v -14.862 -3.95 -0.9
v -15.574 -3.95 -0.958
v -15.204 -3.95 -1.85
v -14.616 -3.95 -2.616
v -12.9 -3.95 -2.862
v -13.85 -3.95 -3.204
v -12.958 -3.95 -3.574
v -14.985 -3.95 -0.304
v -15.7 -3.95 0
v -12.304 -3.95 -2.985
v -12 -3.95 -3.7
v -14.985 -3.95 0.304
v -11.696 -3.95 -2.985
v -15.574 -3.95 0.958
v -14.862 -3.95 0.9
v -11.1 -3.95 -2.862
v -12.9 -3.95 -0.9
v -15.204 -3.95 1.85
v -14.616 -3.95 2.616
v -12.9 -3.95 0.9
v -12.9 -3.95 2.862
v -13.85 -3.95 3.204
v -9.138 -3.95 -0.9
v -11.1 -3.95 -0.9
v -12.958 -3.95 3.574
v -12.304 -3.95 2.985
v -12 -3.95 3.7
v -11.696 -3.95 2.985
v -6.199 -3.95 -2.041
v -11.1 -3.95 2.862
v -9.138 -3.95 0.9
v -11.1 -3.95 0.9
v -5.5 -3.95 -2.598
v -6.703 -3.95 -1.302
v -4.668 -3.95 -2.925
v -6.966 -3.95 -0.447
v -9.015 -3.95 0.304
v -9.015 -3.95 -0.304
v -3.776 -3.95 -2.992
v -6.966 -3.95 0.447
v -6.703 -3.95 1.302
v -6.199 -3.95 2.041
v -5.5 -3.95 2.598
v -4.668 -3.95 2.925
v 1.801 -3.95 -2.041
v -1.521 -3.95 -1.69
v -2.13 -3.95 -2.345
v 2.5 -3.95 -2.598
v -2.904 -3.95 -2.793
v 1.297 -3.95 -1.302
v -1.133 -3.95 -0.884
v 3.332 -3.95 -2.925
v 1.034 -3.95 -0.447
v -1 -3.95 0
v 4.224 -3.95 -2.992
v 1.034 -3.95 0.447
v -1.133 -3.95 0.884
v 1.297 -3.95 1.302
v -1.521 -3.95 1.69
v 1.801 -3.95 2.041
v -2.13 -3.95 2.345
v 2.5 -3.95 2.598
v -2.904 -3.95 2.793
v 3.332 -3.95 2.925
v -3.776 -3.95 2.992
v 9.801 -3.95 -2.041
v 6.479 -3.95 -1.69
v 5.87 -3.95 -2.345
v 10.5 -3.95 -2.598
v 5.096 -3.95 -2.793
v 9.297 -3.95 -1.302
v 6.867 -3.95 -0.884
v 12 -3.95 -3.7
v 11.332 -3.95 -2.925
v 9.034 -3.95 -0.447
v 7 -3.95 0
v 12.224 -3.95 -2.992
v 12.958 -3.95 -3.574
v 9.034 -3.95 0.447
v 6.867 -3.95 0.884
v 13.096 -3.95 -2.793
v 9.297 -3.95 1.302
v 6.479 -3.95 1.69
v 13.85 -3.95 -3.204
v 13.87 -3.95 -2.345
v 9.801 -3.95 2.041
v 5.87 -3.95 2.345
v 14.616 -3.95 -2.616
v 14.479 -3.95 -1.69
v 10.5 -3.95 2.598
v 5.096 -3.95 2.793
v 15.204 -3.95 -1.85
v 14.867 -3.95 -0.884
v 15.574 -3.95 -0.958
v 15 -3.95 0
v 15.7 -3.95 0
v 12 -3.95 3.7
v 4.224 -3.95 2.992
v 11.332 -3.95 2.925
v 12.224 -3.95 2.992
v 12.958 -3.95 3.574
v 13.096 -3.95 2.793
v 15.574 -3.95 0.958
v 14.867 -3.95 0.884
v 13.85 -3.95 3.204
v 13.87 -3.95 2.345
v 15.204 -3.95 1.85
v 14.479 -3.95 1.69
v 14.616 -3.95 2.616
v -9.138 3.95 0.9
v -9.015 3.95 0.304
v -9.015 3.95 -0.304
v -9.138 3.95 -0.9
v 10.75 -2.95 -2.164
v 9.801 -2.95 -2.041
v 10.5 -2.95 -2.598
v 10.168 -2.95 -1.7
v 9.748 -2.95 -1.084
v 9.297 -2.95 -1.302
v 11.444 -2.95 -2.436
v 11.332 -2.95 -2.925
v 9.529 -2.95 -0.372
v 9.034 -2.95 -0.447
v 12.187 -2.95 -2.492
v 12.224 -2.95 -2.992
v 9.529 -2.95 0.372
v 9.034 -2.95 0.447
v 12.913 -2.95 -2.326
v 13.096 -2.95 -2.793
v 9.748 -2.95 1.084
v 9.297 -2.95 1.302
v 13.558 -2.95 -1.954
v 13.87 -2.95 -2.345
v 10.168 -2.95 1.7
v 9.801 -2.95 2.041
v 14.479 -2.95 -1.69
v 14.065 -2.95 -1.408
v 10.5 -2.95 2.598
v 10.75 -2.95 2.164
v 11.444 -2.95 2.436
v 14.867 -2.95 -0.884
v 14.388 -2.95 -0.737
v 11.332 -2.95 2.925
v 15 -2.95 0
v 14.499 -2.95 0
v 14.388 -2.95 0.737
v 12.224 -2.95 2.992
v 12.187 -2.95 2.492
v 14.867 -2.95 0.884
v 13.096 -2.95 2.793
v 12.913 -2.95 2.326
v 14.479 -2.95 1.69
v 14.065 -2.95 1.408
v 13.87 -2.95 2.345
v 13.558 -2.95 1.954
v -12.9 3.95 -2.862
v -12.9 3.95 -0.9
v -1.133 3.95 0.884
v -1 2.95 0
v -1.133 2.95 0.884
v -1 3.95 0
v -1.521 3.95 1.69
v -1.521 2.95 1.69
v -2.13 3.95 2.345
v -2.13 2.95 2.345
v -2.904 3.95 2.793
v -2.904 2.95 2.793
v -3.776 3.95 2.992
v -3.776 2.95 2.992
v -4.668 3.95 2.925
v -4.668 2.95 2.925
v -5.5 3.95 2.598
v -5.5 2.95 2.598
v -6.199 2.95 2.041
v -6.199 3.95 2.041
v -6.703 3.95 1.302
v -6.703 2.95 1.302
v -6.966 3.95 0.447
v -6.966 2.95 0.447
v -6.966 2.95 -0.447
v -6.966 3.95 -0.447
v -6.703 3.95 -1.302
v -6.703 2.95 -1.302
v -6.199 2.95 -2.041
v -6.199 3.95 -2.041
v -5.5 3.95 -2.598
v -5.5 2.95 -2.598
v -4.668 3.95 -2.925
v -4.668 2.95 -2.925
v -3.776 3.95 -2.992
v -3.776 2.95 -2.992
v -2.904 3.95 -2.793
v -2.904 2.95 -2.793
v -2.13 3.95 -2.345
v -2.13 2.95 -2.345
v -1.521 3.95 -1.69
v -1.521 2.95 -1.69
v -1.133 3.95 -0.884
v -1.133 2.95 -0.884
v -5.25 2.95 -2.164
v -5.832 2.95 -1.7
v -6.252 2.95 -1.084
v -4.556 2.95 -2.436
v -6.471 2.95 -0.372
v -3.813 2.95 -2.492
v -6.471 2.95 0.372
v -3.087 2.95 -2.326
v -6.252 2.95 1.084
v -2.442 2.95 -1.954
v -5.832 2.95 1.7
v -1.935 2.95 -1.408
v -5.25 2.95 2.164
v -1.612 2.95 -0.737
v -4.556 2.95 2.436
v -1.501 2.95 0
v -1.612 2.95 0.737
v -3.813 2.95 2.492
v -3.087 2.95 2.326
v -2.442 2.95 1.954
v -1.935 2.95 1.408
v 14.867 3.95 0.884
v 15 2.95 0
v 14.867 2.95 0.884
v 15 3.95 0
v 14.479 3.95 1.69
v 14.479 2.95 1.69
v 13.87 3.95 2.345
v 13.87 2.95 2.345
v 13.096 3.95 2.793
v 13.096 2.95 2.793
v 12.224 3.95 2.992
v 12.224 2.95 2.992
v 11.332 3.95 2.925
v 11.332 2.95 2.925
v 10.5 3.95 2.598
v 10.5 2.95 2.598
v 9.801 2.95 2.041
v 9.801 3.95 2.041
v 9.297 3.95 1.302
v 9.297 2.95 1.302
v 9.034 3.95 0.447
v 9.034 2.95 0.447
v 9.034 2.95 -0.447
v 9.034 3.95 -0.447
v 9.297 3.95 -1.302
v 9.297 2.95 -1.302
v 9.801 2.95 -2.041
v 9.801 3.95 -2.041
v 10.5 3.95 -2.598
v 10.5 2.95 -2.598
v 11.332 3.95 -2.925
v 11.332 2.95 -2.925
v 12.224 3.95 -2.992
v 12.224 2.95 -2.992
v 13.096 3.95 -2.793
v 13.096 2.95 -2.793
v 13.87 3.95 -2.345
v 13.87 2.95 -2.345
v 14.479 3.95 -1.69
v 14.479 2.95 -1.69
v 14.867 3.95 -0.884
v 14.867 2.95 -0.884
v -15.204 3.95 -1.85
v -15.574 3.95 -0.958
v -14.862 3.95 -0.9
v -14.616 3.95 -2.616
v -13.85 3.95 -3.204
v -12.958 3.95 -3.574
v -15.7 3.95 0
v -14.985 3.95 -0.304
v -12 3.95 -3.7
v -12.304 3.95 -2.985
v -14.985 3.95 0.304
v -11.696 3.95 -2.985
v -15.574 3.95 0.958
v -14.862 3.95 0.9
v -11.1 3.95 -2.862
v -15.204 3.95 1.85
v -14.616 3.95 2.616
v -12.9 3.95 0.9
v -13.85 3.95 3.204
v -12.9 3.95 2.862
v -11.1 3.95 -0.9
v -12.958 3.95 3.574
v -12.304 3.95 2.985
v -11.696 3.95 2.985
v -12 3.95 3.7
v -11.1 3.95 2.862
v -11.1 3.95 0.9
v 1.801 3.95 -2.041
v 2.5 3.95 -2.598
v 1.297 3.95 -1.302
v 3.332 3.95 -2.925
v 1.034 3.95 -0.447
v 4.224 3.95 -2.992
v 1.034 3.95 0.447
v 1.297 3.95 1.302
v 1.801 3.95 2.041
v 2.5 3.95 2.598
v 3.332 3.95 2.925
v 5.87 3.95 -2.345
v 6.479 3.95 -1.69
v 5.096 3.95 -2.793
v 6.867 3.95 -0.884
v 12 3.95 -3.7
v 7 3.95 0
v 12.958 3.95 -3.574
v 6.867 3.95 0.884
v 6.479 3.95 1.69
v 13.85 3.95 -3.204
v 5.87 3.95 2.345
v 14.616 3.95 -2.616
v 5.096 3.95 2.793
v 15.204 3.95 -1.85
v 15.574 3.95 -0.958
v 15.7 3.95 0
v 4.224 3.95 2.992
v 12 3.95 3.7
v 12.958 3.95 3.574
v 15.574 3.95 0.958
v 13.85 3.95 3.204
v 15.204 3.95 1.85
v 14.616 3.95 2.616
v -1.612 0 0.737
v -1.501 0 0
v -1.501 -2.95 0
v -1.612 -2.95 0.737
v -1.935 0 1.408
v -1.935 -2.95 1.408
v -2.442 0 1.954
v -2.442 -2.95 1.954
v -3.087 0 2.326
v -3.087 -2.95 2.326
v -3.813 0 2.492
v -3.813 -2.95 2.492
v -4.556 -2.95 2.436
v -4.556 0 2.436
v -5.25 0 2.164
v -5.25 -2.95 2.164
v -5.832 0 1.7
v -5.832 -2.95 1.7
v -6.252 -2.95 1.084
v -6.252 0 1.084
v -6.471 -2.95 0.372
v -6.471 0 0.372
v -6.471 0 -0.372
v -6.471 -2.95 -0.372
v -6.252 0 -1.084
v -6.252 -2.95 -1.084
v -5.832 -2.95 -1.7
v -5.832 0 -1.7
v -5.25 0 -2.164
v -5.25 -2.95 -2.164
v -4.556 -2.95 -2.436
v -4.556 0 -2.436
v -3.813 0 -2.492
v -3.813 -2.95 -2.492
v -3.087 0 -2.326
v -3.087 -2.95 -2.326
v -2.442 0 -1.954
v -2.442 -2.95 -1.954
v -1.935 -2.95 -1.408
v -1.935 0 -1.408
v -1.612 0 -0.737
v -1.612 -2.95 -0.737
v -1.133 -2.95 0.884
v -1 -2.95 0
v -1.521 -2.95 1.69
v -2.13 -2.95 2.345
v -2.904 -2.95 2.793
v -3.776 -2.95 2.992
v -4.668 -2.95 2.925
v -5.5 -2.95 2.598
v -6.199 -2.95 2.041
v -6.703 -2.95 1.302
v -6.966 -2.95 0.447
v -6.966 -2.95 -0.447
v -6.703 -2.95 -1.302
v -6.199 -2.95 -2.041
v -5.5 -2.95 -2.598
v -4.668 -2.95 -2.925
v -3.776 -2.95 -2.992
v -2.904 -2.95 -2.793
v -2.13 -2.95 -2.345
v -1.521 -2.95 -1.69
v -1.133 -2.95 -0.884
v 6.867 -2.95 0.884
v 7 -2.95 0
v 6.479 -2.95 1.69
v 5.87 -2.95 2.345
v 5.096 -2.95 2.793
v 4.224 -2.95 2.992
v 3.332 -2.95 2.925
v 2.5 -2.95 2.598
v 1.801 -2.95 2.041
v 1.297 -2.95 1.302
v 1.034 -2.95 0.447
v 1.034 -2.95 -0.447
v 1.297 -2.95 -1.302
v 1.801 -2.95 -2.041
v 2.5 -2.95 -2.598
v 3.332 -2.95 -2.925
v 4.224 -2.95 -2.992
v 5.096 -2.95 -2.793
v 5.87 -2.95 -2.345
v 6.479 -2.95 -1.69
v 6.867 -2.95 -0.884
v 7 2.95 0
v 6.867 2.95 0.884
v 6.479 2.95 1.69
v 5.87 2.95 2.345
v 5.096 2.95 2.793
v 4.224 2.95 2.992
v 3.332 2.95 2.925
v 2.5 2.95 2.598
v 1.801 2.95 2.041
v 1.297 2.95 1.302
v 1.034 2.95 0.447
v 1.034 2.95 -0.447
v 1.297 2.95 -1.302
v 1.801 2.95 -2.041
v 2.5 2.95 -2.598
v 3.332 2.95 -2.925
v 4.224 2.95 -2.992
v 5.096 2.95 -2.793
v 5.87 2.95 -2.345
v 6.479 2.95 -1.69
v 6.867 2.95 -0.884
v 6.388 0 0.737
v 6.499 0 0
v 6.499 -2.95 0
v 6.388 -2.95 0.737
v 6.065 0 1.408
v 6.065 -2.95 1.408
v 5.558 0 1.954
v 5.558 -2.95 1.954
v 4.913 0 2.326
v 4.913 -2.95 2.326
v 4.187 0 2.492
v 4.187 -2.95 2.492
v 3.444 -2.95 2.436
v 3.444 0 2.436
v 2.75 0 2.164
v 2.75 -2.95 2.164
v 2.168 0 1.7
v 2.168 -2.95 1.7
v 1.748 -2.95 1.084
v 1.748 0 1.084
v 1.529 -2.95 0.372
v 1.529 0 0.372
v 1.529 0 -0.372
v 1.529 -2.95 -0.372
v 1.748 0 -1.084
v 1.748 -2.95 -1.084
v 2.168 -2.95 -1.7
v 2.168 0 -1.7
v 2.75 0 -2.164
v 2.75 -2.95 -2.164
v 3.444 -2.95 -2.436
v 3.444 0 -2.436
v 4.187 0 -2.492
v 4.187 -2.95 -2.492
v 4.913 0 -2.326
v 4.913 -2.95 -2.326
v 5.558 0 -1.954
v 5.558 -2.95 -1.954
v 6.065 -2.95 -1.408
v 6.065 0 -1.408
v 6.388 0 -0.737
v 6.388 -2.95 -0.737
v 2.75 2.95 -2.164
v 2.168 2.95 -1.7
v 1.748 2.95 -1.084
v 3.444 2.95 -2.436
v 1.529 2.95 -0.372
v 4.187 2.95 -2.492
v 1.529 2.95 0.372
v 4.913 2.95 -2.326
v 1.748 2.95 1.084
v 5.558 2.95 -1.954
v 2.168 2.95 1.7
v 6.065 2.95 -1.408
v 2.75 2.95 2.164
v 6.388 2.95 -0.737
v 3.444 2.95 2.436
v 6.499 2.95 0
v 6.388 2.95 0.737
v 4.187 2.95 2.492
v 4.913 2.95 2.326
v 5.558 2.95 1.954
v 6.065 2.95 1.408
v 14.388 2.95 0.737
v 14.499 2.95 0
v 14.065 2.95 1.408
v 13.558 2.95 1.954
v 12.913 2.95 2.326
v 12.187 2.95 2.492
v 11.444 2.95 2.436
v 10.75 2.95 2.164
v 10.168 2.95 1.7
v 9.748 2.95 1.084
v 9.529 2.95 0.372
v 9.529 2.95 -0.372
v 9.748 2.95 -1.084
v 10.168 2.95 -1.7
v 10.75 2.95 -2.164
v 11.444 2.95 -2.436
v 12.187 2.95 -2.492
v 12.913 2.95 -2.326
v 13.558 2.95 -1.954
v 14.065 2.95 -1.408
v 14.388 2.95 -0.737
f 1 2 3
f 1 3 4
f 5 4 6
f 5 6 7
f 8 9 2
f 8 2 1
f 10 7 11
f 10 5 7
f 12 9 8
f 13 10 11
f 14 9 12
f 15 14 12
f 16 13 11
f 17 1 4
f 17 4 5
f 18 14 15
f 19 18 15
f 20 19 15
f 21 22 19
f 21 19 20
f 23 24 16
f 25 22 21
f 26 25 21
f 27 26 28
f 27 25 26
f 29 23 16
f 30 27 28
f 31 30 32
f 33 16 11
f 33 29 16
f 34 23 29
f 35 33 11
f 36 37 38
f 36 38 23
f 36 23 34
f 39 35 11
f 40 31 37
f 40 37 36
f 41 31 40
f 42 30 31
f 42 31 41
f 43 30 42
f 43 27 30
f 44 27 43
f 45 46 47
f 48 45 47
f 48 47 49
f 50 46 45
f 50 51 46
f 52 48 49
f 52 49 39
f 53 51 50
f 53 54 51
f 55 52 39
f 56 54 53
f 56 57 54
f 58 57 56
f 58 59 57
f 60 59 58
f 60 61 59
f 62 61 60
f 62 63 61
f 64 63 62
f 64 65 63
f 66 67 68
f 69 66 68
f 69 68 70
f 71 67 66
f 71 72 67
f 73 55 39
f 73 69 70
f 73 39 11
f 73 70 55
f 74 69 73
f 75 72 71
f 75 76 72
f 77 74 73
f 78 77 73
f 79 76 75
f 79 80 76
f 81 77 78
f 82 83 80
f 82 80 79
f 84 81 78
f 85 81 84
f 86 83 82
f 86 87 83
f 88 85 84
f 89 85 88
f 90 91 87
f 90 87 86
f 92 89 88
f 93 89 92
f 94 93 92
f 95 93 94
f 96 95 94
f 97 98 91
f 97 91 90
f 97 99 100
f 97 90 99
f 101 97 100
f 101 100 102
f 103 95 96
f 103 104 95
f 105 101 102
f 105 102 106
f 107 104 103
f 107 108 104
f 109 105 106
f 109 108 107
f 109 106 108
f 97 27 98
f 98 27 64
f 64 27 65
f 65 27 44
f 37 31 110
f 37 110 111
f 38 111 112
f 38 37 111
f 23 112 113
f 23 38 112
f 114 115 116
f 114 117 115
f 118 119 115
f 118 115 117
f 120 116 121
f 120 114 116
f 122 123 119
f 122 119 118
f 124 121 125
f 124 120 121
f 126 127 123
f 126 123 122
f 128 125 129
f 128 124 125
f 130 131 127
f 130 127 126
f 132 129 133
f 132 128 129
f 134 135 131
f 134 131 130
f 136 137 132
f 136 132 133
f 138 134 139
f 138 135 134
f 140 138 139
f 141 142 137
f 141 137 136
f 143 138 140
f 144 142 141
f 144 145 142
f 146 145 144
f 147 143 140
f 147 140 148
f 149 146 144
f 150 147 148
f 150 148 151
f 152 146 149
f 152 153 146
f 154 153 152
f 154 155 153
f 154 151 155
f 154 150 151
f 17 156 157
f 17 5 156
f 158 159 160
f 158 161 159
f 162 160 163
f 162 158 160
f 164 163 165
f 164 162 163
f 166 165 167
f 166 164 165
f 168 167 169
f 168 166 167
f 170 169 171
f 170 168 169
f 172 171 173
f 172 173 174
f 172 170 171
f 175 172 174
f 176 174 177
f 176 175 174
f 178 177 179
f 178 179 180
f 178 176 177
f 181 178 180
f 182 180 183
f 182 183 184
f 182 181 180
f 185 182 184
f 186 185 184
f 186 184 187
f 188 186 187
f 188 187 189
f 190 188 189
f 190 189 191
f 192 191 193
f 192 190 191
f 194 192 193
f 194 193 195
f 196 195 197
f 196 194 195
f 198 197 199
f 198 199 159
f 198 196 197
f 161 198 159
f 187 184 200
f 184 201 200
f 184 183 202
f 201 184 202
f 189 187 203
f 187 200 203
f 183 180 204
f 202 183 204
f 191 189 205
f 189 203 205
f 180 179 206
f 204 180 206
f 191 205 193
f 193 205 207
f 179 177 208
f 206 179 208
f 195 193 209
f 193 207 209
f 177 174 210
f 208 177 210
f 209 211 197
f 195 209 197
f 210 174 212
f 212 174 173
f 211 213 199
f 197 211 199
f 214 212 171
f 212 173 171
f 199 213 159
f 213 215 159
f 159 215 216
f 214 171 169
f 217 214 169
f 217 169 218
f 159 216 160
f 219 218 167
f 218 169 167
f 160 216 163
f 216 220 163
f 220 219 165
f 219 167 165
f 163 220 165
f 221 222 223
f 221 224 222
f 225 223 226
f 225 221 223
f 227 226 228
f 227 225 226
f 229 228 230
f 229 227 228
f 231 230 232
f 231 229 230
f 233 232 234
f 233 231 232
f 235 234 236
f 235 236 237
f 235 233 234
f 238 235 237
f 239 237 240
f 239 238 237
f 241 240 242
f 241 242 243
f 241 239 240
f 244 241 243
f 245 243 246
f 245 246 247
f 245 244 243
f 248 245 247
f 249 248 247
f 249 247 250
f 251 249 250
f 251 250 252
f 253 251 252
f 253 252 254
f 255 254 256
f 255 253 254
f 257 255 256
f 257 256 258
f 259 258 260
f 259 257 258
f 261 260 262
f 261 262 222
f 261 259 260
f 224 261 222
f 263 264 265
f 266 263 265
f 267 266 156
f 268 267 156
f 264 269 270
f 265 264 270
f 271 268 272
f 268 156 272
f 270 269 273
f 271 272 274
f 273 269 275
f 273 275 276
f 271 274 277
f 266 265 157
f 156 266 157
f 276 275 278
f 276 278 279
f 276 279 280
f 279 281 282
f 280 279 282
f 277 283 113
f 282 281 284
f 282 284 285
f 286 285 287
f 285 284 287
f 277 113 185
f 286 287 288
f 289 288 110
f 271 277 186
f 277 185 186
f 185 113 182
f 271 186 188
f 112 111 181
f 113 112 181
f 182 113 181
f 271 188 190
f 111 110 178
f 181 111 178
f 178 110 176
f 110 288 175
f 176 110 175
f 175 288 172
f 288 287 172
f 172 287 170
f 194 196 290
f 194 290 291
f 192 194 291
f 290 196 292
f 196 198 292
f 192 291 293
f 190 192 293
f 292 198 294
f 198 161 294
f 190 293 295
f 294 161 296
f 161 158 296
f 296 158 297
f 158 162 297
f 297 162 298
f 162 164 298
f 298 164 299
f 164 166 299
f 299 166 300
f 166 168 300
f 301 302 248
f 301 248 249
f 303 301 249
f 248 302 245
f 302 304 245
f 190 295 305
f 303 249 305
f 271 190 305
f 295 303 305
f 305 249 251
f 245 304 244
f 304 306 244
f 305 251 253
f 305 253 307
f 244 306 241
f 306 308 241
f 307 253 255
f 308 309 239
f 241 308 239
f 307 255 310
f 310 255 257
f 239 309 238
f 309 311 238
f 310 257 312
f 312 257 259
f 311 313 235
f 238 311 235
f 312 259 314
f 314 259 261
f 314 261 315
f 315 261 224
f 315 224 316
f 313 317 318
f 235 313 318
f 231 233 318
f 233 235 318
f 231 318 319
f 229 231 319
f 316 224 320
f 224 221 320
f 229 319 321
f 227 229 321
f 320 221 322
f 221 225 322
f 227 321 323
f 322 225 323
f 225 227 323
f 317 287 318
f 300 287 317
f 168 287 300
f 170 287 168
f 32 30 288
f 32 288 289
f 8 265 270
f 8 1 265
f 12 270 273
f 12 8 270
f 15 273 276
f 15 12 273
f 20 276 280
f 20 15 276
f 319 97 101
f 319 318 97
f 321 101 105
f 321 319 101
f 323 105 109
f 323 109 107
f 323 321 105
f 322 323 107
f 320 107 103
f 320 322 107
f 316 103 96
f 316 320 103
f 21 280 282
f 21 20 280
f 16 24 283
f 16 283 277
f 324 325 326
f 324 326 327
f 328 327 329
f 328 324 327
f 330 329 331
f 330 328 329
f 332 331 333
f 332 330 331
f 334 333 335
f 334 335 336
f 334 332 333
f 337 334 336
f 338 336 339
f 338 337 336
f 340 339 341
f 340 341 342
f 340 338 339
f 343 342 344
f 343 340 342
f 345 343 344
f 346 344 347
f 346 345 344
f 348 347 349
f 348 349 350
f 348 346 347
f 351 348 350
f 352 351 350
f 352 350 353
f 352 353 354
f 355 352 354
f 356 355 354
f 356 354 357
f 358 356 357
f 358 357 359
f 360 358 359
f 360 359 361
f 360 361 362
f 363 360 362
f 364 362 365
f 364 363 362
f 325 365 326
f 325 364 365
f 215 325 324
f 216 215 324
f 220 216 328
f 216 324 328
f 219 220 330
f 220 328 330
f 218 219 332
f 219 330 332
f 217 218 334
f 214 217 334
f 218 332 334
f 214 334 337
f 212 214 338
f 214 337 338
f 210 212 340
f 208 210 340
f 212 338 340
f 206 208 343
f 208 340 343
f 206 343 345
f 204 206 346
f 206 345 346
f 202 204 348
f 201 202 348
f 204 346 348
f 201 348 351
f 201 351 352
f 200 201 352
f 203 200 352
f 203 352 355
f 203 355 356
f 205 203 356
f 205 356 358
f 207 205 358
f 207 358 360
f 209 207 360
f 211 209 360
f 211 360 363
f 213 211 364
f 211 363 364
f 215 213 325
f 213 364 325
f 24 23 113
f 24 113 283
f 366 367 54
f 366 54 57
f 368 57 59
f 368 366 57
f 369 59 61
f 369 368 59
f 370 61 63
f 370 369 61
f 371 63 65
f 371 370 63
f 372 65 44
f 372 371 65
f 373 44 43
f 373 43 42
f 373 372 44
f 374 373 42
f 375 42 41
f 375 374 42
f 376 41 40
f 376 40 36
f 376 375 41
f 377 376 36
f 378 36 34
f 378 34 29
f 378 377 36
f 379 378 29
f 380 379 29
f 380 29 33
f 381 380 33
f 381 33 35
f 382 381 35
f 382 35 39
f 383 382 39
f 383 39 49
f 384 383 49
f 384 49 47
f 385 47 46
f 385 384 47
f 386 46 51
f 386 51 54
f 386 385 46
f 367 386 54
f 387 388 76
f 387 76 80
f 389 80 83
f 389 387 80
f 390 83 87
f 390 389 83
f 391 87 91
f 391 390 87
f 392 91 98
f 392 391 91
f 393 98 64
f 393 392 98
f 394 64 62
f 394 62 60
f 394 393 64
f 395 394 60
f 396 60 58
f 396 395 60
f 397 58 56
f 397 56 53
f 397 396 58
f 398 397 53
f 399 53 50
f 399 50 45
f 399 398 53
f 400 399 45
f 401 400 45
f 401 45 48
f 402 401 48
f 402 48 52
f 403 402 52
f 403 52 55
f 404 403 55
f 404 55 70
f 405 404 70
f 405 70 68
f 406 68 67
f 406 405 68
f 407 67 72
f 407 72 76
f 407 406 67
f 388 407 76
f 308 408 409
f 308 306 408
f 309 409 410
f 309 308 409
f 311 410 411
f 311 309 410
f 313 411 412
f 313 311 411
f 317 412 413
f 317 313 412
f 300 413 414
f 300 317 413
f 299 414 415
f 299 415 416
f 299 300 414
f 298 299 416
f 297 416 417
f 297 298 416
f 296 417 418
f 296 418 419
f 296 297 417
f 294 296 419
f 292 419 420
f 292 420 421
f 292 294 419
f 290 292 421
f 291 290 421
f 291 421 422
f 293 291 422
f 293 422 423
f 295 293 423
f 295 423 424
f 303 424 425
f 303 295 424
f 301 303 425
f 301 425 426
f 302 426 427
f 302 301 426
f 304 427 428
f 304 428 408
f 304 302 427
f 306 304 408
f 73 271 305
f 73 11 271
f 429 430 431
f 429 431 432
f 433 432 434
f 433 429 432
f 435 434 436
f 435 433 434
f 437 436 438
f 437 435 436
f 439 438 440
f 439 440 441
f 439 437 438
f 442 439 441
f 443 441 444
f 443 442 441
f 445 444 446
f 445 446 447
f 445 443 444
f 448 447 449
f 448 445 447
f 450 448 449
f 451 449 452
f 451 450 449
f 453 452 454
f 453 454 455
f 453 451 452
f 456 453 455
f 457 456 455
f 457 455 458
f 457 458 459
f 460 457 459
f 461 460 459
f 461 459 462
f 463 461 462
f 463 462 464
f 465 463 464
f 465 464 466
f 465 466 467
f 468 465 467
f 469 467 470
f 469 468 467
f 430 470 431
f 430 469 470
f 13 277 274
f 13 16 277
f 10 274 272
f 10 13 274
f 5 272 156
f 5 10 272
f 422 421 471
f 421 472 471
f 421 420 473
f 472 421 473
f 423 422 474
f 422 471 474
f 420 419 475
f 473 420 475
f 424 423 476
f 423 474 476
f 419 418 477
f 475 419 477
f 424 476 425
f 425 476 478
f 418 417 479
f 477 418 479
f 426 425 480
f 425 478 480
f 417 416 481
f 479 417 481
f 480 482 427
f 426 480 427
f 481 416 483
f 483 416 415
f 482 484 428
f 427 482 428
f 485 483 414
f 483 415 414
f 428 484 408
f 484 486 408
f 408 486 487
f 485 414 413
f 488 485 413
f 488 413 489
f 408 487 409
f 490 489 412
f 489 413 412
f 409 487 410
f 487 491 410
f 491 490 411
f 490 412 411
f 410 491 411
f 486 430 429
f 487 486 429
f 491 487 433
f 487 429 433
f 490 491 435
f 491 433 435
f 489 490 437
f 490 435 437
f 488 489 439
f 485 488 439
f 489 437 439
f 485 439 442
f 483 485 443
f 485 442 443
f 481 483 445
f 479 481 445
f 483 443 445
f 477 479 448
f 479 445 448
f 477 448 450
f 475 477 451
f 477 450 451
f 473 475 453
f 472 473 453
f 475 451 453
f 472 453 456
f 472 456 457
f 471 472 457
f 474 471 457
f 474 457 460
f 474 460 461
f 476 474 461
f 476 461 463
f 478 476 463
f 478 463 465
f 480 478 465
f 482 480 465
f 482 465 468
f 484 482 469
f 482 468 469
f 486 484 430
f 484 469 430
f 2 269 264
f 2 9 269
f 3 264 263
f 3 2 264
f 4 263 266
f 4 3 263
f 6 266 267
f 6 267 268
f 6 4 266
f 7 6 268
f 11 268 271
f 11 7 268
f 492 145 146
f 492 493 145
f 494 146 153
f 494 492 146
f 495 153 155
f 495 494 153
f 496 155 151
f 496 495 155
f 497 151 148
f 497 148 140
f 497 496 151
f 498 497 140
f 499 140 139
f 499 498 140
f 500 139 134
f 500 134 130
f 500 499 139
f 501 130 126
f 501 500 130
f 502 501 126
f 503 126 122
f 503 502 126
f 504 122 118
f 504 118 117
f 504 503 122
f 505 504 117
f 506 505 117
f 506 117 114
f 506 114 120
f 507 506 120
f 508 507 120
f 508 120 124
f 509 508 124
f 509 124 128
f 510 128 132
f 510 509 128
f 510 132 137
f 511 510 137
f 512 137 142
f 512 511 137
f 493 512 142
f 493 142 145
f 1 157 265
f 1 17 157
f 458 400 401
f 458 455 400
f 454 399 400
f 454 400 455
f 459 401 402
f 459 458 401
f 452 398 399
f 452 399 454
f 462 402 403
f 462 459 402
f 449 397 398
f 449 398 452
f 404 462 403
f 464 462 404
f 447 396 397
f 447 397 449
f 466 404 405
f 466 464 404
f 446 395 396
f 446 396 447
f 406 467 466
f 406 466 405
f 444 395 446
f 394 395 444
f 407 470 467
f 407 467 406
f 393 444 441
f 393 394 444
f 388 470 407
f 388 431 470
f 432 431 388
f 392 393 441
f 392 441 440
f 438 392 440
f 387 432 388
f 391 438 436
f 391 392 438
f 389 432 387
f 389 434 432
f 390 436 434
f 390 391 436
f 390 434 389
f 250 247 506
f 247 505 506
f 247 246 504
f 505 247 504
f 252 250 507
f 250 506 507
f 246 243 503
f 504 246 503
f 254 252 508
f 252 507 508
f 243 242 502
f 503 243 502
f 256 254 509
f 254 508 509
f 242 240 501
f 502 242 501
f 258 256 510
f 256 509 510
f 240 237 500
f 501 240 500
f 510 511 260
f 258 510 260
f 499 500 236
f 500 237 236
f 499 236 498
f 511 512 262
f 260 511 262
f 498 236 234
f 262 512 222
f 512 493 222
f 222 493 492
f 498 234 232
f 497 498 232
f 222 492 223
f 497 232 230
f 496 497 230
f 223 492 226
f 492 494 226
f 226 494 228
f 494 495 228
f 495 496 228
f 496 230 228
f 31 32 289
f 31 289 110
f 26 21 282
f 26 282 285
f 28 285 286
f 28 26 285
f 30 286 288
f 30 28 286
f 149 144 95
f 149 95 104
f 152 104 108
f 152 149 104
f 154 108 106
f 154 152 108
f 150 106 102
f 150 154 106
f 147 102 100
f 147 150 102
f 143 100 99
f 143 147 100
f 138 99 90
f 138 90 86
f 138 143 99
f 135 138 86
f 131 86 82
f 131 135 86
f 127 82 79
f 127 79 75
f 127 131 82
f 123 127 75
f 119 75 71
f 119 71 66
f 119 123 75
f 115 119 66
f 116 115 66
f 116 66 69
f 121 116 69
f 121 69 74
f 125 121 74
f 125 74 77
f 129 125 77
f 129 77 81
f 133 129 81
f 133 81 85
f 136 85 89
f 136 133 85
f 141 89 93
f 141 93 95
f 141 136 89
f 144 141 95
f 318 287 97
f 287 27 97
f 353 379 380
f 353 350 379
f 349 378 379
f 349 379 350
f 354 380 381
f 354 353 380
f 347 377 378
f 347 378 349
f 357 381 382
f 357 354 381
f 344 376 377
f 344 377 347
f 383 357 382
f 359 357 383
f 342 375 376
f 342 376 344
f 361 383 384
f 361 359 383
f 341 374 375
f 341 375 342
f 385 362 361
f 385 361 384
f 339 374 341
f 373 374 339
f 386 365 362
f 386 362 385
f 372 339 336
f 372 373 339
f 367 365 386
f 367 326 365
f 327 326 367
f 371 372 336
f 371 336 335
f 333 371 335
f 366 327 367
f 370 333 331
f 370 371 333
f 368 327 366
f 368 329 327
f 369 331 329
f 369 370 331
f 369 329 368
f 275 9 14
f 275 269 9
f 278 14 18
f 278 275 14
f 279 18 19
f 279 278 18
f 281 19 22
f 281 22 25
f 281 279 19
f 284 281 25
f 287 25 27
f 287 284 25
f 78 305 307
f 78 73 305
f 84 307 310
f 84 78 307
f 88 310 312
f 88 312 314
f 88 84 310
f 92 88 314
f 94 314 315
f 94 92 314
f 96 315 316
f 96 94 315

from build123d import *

# Parameters (mm, degrees)
F0_W     = 31.4
F0_H     = 7.4
F0_R     = 3
F1_DEPTH = 3.95
F0_R_2   = 2.499
F2_DEPTH = 2.95
F3_R     = 3.69999


# Not quite as in the source:
# - a fillet or chamfer is up to 0.001 mm smaller than in the source, because OpenCascade refuses the exact size


with BuildPart() as f1:
    # F0 (on Front) → F1 (new body, symmetric)
    with BuildSketch(Plane.XZ):
        Rectangle(F0_W, F0_H)
        with BuildLine():
            ThreePointArc((-12.9, 2.8618176043), (-12, 3), (-11.1, 2.8618176043))
            Line((-11.1, 2.8618176043), (-11.1, 0.9))
            Line((-11.1, 0.9), (-9.1381823957, 0.9))
            ThreePointArc((-9.1381823957, 0.9), (-9, 0), (-9.1381823957, -0.9))
            Line((-9.1381823957, -0.9), (-11.1, -0.9))
            Line((-11.1, -0.9), (-11.1, -2.8618176043))
            ThreePointArc((-11.1, -2.8618176043), (-12, -3), (-12.9, -2.8618176043))
            Line((-12.9, -2.8618176043), (-12.9, -0.9))
            Line((-12.9, -0.9), (-14.8618176043, -0.9))
            ThreePointArc((-14.8618176043, -0.9), (-15, 0), (-14.8618176043, 0.9))
            Line((-14.8618176043, 0.9), (-12.9, 0.9))
            Line((-12.9, 0.9), (-12.9, 2.8618176043))
        make_face(mode=Mode.SUBTRACT)
        with Locations((-4, 0)):
            Circle(F0_R, mode=Mode.SUBTRACT)
        with Locations((4, 0)):
            Circle(F0_R, mode=Mode.SUBTRACT)
        with Locations((12, 0)):
            Circle(F0_R, mode=Mode.SUBTRACT)
    extrude(amount=F1_DEPTH, both=True)

    # F0 (on Front) → F2 (join, symmetric)
    with BuildSketch(Plane.XZ):
        with Locations((-4, 0)):
            Circle(F0_R)
        with Locations((-4, 0)):
            Circle(F0_R_2, mode=Mode.SUBTRACT)
        with Locations((4, 0)):
            Circle(F0_R)
        with Locations((4, 0)):
            Circle(F0_R_2, mode=Mode.SUBTRACT)
        with Locations((12, 0)):
            Circle(F0_R)
        with Locations((12, 0)):
            Circle(F0_R_2, mode=Mode.SUBTRACT)
    extrude(amount=F2_DEPTH, both=True)

    # F3 (radius 3.7 in the source; OpenCascade refuses exactly that, so slightly less here)
    f3_edges = [f1.edges().sort_by_distance(p)[0] for p in [
        (-15.7, 0, 3.7),
        (-15.7, 0, -3.7),
        (15.7, 0, 3.7),
        (15.7, 0, -3.7),
    ]]
    fillet(f3_edges, radius=F3_R)


solid = f1.part
